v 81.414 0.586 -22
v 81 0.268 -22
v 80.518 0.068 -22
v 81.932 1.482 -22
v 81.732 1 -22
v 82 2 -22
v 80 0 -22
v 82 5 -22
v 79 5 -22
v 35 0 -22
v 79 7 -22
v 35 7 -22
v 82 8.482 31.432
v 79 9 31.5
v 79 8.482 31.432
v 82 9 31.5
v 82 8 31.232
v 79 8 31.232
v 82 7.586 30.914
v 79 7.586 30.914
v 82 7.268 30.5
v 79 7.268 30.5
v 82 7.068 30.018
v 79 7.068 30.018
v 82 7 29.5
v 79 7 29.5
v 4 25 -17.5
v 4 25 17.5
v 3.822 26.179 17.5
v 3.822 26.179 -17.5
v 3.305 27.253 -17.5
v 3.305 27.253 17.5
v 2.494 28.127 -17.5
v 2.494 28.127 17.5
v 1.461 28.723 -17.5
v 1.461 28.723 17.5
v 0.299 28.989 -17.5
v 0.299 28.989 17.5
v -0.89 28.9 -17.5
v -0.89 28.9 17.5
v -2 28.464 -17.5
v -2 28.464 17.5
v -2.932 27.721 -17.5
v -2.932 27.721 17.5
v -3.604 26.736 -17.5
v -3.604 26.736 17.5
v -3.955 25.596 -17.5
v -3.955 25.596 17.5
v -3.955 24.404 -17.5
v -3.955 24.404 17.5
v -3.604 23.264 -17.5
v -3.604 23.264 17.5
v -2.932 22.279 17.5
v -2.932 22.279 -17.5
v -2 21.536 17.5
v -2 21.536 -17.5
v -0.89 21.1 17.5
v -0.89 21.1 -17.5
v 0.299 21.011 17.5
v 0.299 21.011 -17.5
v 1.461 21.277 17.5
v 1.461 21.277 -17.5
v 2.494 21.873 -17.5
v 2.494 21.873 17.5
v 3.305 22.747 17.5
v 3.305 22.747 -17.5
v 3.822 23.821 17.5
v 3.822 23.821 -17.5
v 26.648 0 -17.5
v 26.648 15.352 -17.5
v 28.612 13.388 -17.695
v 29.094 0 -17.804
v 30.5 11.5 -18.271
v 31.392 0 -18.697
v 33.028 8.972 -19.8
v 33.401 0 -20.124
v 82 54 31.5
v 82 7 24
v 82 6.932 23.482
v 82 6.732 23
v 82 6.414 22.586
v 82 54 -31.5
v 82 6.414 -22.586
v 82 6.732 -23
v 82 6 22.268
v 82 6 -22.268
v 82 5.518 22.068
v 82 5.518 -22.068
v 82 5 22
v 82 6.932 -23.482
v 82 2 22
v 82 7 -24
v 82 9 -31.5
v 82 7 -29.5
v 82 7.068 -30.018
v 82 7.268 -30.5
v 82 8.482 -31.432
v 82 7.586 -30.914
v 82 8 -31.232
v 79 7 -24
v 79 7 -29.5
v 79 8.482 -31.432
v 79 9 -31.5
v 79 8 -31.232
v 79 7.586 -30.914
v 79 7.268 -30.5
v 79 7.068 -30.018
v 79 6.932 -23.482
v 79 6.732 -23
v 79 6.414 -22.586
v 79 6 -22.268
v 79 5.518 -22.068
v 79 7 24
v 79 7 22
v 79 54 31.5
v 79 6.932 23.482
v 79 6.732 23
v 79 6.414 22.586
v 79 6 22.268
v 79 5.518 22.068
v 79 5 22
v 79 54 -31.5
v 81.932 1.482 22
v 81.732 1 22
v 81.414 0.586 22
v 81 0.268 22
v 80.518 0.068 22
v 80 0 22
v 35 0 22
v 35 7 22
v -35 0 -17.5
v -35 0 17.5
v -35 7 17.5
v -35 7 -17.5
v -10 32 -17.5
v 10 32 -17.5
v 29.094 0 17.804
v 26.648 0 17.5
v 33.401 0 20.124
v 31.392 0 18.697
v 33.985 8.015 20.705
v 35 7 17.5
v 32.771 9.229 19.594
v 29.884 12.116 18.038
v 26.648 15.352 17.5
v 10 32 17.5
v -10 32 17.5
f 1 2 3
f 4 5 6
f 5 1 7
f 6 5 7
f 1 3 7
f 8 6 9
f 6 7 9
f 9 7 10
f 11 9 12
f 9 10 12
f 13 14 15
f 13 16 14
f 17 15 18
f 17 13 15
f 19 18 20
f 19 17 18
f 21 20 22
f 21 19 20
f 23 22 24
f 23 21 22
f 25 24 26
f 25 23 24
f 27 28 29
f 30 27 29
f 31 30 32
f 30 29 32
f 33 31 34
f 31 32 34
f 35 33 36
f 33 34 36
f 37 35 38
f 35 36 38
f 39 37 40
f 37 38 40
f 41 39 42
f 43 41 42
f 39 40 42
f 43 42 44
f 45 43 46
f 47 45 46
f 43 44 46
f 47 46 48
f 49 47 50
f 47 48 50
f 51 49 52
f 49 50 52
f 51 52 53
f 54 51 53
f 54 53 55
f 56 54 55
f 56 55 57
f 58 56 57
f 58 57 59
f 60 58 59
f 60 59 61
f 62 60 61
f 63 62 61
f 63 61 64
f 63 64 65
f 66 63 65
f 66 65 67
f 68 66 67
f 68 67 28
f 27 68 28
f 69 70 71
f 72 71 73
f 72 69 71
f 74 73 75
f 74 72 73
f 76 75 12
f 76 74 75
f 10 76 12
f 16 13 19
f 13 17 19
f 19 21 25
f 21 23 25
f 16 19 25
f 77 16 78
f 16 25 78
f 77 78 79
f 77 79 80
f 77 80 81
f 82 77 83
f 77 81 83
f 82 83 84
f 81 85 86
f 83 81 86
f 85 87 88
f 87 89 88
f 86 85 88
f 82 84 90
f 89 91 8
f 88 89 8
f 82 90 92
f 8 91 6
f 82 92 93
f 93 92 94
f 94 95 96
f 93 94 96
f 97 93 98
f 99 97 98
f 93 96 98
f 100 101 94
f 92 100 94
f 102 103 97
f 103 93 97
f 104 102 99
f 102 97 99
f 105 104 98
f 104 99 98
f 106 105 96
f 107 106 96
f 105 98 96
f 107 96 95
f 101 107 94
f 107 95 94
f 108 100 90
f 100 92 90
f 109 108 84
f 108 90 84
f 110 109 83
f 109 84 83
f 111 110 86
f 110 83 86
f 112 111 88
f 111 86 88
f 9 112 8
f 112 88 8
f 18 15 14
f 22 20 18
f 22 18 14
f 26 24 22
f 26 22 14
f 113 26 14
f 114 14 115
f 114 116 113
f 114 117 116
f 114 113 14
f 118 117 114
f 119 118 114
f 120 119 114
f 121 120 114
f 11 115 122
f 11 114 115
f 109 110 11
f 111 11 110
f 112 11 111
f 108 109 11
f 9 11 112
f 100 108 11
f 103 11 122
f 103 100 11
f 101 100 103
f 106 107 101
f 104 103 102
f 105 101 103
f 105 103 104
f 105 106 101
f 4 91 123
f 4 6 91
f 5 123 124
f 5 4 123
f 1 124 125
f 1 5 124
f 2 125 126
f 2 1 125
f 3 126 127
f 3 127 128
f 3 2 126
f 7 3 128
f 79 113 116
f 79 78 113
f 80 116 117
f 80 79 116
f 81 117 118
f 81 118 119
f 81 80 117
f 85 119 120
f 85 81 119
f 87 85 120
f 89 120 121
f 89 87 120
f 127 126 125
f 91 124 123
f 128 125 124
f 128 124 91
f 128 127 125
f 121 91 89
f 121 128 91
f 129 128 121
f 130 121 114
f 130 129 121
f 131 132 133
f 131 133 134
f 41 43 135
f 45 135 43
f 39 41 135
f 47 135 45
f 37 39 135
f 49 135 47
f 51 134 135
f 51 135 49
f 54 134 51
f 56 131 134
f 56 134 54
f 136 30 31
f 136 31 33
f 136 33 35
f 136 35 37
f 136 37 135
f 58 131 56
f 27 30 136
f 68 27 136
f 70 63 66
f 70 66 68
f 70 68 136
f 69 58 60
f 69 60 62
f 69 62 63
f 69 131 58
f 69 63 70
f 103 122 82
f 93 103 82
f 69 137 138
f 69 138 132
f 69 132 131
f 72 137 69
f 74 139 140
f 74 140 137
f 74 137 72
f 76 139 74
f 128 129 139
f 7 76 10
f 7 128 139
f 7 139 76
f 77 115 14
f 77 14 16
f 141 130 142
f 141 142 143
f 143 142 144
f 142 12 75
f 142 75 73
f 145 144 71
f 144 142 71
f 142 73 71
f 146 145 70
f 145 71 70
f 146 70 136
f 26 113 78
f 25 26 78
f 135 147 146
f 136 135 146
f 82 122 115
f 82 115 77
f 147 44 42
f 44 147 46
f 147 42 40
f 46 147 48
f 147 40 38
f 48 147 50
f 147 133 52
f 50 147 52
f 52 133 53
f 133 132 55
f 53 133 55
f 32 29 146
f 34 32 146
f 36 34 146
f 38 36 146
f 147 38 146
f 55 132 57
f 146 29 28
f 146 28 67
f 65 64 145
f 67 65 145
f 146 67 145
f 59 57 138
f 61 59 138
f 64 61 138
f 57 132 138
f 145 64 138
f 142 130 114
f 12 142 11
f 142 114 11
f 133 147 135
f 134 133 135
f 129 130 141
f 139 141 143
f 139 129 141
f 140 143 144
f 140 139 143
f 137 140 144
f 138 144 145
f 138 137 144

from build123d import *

# Parameters (mm, degrees)
SKETCH1_W           = 70
SKETCH1_H           = 35
BOSS_EXTRUDE1_DEPTH = 32
SKETCH2_R           = 4
CUT_EXTRUDE1_DEPTH  = 59.940648113
CHAMFER1_SIZE       = 25
SKETCH3_W           = 44
SKETCH3_H           = 7
BOSS_EXTRUDE2_DEPTH = 47
FILLET1_R           = 10
FILLET2_R           = 10
SKETCH4_W           = 3
SKETCH4_H           = 63
BOSS_EXTRUDE3_DEPTH = 47
FILLET3_R           = 2


with BuildPart() as part:
    # Sketch1 → Boss-Extrude1 (new body)
    with BuildSketch(Plane(origin=(0, 0, 0), x_dir=(1, 0, 0), z_dir=(0, 1, 0))):
        Rectangle(SKETCH1_W, SKETCH1_H)
    extrude(amount=BOSS_EXTRUDE1_DEPTH)

    # Sketch2 → Cut-Extrude1 (cut, through all)
    with BuildSketch(Plane.XY.offset(17.5)):
        with Locations((0, 25)):
            Circle(SKETCH2_R)
    extrude(amount=-CUT_EXTRUDE1_DEPTH, mode=Mode.SUBTRACT)

    # Chamfer1
    chamfer1_edges = [part.edges().sort_by_distance(p)[0] for p in [
        (-35, 32, 0),
        (35, 32, 0),
    ]]
    chamfer(chamfer1_edges, length=CHAMFER1_SIZE)

    # Sketch3 → Boss-Extrude2 (add)
    with BuildSketch(Plane(origin=(35, 0, 0), x_dir=(0, 0, -1), z_dir=(1, 0, 0))):
        with Locations((0, 3.5)):
            Rectangle(SKETCH3_W, SKETCH3_H)
    extrude(amount=BOSS_EXTRUDE2_DEPTH)

    # Fillet1
    # the kernel refuses this fillet: 10 mm, written as the material it adds along each edge
    with BuildSketch(Plane(origin=(35, 0, -17.5), x_dir=(-1.5347723092402642e-12, 0, -1.0), z_dir=(0, 1, 0))) as fillet1_piece_1_section:
        with BuildLine():
            CenterArc((10, 8.351646544), FILLET1_R, 180, 56.632987031)
            Line((0, 8.351646544), (-0.2, 8.351646544))
            Line((-0.2, 8.351646544), (-0.2, 0))
            Line((-0.2, 0), (0, -0.2))
            ThreePointArc((0, -0.2), (2.25, -0.2), (4.39, -0.167032931))
            Line((4.39, -0.167032931), (4.5, 0))
        make_face()
    fillet1_piece_1 = extrude(amount=7, mode=Mode.PRIVATE)
    fillet1_piece_1 = split(fillet1_piece_1, bisect_by=Plane(origin=(35.692594852, 6.307405148, -18.660307251), z_dir=(-0.7071067811865476, -0.7071067811865476, 0)), keep=Keep.TOP, mode=Mode.PRIVATE)
    add(fillet1_piece_1)
    with BuildSketch(Plane(origin=(35, 0, -17.5), x_dir=(-1.5347723092402642e-12, 0, -1.0), z_dir=(0, 1, 0))) as fillet1_piece_2_section:
        with BuildLine():
            CenterArc((10, 8.351646544), FILLET1_R, 180, 56.632987031)
            Line((0, 8.351646544), (-0.2, 8.351646544))
            Line((-0.2, 8.351646544), (-0.2, 0))
            Line((-0.2, 0), (0, -0.2))
            ThreePointArc((0, -0.2), (2.25, -0.2), (4.39, -0.167032931))
            Line((4.39, -0.167032931), (4.5, 0))
        make_face()
    fillet1_piece_2 = extrude(amount=27.879116361, mode=Mode.PRIVATE)
    fillet1_piece_2 = split(fillet1_piece_2, bisect_by=Plane(origin=(31.191797934, 7, -18.092333784), z_dir=(0, 1, 0)), keep=Keep.TOP, mode=Mode.PRIVATE)
    fillet1_piece_2 = split(fillet1_piece_2, bisect_by=Plane(origin=(32.143848451, 9.856151549, -18.092333784), z_dir=(-0.7071067811865476, -0.7071067811865476, 0)), keep=Keep.TOP, mode=Mode.PRIVATE)
    add(fillet1_piece_2)
    with BuildSketch(Plane(origin=(35, 0, -17.5), x_dir=(-1.5347723092402642e-12, 0, -1.0), z_dir=(0, 1, 0))) as fillet1_piece_3_section:
        with BuildLine():
            CenterArc((10, 8.351646544), FILLET1_R, 180, 56.632987031)
            Line((0, 8.351646544), (-0.2, 8.351646544))
            Line((-0.2, 8.351646544), (-0.2, 0))
            Line((-0.2, 0), (0, -0.2))
            ThreePointArc((0, -0.2), (2.25, -0.2), (4.39, -0.167032931))
            Line((4.39, -0.167032931), (4.5, 0))
        make_face()
    fillet1_piece_3 = extrude(amount=7, mode=Mode.PRIVATE)
    fillet1_piece_3 = split(fillet1_piece_3, bisect_by=Plane(origin=(35.097400014, 6.902599986, -19.555271065), z_dir=(0.7071067811865476, 0.7071067811865476, 0)), keep=Keep.TOP, mode=Mode.PRIVATE)
    add(fillet1_piece_3)

    # Fillet2
    # the kernel refuses this fillet: 10 mm, written as the material it adds along each edge
    with BuildSketch(Plane(origin=(35, 0, 17.5), x_dir=(-1.5331933253830236e-12, 0, 1.0), z_dir=(0, 1, 0))) as fillet2_piece_1_section:
        with BuildLine():
            CenterArc((10, -8.351646544), FILLET2_R, 123.367012969, 56.632987031)
            Line((0, -8.351646544), (-0.2, -8.351646544))
            Line((-0.2, -8.351646544), (-0.2, 0))
            Line((-0.2, 0), (0, 0.2))
            ThreePointArc((0, 0.2), (2.25, 0.2), (4.39, 0.167032931))
            Line((4.39, 0.167032931), (4.5, 0))
        make_face()
    fillet2_piece_1 = extrude(amount=7, mode=Mode.PRIVATE)
    fillet2_piece_1 = split(fillet2_piece_1, bisect_by=Plane(origin=(35.692594852, 6.307405148, 18.660307251), z_dir=(-0.7071067811865476, -0.7071067811865476, 0)), keep=Keep.TOP, mode=Mode.PRIVATE)
    add(fillet2_piece_1)
    with BuildSketch(Plane(origin=(35, 0, 17.5), x_dir=(-1.5331933253830236e-12, 0, 1.0), z_dir=(0, 1, 0))) as fillet2_piece_2_section:
        with BuildLine():
            CenterArc((10, -8.351646544), FILLET2_R, 123.367012969, 56.632987031)
            Line((0, -8.351646544), (-0.2, -8.351646544))
            Line((-0.2, -8.351646544), (-0.2, 0))
            Line((-0.2, 0), (0, 0.2))
            ThreePointArc((0, 0.2), (2.25, 0.2), (4.39, 0.167032931))
            Line((4.39, 0.167032931), (4.5, 0))
        make_face()
    fillet2_piece_2 = extrude(amount=27.879116361, mode=Mode.PRIVATE)
    fillet2_piece_2 = split(fillet2_piece_2, bisect_by=Plane(origin=(31.191797934, 7, 18.092333784), z_dir=(0, 1, 0)), keep=Keep.TOP, mode=Mode.PRIVATE)
    fillet2_piece_2 = split(fillet2_piece_2, bisect_by=Plane(origin=(32.143848451, 9.856151549, 18.092333784), z_dir=(-0.7071067811865476, -0.7071067811865476, 0)), keep=Keep.TOP, mode=Mode.PRIVATE)
    add(fillet2_piece_2)
    with BuildSketch(Plane(origin=(35, 0, 17.5), x_dir=(-1.5331933253830236e-12, 0, 1.0), z_dir=(0, 1, 0))) as fillet2_piece_3_section:
        with BuildLine():
            CenterArc((10, -8.351646544), FILLET2_R, 123.367012969, 56.632987031)
            Line((0, -8.351646544), (-0.2, -8.351646544))
            Line((-0.2, -8.351646544), (-0.2, 0))
            Line((-0.2, 0), (0, 0.2))
            ThreePointArc((0, 0.2), (2.25, 0.2), (4.39, 0.167032931))
            Line((4.39, 0.167032931), (4.5, 0))
        make_face()
    fillet2_piece_3 = extrude(amount=7, mode=Mode.PRIVATE)
    fillet2_piece_3 = split(fillet2_piece_3, bisect_by=Plane(origin=(35.097400014, 6.902599986, 19.555271065), z_dir=(0.7071067811865476, 0.7071067811865476, 0)), keep=Keep.TOP, mode=Mode.PRIVATE)
    add(fillet2_piece_3)

    # Sketch4 → Boss-Extrude3 (add)
    with BuildSketch(Plane(origin=(0, 7, 0), x_dir=(1, 0, 0), z_dir=(0, 1, 0))):
        with Locations((80.5, 0)):
            Rectangle(SKETCH4_W, SKETCH4_H)
    extrude(amount=BOSS_EXTRUDE3_DEPTH)

    # Fillet3
    fillet3_edges = [part.edges().sort_by_distance(p)[0] for p in [
        (80.5, 7, 22),
        (80.5, 7, -22),
        (82, 0, 0),
        (80.5, 7, -31.5),
        (80.5, 7, 31.5),
    ]]
    fillet(fillet3_edges, radius=FILLET3_R)


solid = part.part
